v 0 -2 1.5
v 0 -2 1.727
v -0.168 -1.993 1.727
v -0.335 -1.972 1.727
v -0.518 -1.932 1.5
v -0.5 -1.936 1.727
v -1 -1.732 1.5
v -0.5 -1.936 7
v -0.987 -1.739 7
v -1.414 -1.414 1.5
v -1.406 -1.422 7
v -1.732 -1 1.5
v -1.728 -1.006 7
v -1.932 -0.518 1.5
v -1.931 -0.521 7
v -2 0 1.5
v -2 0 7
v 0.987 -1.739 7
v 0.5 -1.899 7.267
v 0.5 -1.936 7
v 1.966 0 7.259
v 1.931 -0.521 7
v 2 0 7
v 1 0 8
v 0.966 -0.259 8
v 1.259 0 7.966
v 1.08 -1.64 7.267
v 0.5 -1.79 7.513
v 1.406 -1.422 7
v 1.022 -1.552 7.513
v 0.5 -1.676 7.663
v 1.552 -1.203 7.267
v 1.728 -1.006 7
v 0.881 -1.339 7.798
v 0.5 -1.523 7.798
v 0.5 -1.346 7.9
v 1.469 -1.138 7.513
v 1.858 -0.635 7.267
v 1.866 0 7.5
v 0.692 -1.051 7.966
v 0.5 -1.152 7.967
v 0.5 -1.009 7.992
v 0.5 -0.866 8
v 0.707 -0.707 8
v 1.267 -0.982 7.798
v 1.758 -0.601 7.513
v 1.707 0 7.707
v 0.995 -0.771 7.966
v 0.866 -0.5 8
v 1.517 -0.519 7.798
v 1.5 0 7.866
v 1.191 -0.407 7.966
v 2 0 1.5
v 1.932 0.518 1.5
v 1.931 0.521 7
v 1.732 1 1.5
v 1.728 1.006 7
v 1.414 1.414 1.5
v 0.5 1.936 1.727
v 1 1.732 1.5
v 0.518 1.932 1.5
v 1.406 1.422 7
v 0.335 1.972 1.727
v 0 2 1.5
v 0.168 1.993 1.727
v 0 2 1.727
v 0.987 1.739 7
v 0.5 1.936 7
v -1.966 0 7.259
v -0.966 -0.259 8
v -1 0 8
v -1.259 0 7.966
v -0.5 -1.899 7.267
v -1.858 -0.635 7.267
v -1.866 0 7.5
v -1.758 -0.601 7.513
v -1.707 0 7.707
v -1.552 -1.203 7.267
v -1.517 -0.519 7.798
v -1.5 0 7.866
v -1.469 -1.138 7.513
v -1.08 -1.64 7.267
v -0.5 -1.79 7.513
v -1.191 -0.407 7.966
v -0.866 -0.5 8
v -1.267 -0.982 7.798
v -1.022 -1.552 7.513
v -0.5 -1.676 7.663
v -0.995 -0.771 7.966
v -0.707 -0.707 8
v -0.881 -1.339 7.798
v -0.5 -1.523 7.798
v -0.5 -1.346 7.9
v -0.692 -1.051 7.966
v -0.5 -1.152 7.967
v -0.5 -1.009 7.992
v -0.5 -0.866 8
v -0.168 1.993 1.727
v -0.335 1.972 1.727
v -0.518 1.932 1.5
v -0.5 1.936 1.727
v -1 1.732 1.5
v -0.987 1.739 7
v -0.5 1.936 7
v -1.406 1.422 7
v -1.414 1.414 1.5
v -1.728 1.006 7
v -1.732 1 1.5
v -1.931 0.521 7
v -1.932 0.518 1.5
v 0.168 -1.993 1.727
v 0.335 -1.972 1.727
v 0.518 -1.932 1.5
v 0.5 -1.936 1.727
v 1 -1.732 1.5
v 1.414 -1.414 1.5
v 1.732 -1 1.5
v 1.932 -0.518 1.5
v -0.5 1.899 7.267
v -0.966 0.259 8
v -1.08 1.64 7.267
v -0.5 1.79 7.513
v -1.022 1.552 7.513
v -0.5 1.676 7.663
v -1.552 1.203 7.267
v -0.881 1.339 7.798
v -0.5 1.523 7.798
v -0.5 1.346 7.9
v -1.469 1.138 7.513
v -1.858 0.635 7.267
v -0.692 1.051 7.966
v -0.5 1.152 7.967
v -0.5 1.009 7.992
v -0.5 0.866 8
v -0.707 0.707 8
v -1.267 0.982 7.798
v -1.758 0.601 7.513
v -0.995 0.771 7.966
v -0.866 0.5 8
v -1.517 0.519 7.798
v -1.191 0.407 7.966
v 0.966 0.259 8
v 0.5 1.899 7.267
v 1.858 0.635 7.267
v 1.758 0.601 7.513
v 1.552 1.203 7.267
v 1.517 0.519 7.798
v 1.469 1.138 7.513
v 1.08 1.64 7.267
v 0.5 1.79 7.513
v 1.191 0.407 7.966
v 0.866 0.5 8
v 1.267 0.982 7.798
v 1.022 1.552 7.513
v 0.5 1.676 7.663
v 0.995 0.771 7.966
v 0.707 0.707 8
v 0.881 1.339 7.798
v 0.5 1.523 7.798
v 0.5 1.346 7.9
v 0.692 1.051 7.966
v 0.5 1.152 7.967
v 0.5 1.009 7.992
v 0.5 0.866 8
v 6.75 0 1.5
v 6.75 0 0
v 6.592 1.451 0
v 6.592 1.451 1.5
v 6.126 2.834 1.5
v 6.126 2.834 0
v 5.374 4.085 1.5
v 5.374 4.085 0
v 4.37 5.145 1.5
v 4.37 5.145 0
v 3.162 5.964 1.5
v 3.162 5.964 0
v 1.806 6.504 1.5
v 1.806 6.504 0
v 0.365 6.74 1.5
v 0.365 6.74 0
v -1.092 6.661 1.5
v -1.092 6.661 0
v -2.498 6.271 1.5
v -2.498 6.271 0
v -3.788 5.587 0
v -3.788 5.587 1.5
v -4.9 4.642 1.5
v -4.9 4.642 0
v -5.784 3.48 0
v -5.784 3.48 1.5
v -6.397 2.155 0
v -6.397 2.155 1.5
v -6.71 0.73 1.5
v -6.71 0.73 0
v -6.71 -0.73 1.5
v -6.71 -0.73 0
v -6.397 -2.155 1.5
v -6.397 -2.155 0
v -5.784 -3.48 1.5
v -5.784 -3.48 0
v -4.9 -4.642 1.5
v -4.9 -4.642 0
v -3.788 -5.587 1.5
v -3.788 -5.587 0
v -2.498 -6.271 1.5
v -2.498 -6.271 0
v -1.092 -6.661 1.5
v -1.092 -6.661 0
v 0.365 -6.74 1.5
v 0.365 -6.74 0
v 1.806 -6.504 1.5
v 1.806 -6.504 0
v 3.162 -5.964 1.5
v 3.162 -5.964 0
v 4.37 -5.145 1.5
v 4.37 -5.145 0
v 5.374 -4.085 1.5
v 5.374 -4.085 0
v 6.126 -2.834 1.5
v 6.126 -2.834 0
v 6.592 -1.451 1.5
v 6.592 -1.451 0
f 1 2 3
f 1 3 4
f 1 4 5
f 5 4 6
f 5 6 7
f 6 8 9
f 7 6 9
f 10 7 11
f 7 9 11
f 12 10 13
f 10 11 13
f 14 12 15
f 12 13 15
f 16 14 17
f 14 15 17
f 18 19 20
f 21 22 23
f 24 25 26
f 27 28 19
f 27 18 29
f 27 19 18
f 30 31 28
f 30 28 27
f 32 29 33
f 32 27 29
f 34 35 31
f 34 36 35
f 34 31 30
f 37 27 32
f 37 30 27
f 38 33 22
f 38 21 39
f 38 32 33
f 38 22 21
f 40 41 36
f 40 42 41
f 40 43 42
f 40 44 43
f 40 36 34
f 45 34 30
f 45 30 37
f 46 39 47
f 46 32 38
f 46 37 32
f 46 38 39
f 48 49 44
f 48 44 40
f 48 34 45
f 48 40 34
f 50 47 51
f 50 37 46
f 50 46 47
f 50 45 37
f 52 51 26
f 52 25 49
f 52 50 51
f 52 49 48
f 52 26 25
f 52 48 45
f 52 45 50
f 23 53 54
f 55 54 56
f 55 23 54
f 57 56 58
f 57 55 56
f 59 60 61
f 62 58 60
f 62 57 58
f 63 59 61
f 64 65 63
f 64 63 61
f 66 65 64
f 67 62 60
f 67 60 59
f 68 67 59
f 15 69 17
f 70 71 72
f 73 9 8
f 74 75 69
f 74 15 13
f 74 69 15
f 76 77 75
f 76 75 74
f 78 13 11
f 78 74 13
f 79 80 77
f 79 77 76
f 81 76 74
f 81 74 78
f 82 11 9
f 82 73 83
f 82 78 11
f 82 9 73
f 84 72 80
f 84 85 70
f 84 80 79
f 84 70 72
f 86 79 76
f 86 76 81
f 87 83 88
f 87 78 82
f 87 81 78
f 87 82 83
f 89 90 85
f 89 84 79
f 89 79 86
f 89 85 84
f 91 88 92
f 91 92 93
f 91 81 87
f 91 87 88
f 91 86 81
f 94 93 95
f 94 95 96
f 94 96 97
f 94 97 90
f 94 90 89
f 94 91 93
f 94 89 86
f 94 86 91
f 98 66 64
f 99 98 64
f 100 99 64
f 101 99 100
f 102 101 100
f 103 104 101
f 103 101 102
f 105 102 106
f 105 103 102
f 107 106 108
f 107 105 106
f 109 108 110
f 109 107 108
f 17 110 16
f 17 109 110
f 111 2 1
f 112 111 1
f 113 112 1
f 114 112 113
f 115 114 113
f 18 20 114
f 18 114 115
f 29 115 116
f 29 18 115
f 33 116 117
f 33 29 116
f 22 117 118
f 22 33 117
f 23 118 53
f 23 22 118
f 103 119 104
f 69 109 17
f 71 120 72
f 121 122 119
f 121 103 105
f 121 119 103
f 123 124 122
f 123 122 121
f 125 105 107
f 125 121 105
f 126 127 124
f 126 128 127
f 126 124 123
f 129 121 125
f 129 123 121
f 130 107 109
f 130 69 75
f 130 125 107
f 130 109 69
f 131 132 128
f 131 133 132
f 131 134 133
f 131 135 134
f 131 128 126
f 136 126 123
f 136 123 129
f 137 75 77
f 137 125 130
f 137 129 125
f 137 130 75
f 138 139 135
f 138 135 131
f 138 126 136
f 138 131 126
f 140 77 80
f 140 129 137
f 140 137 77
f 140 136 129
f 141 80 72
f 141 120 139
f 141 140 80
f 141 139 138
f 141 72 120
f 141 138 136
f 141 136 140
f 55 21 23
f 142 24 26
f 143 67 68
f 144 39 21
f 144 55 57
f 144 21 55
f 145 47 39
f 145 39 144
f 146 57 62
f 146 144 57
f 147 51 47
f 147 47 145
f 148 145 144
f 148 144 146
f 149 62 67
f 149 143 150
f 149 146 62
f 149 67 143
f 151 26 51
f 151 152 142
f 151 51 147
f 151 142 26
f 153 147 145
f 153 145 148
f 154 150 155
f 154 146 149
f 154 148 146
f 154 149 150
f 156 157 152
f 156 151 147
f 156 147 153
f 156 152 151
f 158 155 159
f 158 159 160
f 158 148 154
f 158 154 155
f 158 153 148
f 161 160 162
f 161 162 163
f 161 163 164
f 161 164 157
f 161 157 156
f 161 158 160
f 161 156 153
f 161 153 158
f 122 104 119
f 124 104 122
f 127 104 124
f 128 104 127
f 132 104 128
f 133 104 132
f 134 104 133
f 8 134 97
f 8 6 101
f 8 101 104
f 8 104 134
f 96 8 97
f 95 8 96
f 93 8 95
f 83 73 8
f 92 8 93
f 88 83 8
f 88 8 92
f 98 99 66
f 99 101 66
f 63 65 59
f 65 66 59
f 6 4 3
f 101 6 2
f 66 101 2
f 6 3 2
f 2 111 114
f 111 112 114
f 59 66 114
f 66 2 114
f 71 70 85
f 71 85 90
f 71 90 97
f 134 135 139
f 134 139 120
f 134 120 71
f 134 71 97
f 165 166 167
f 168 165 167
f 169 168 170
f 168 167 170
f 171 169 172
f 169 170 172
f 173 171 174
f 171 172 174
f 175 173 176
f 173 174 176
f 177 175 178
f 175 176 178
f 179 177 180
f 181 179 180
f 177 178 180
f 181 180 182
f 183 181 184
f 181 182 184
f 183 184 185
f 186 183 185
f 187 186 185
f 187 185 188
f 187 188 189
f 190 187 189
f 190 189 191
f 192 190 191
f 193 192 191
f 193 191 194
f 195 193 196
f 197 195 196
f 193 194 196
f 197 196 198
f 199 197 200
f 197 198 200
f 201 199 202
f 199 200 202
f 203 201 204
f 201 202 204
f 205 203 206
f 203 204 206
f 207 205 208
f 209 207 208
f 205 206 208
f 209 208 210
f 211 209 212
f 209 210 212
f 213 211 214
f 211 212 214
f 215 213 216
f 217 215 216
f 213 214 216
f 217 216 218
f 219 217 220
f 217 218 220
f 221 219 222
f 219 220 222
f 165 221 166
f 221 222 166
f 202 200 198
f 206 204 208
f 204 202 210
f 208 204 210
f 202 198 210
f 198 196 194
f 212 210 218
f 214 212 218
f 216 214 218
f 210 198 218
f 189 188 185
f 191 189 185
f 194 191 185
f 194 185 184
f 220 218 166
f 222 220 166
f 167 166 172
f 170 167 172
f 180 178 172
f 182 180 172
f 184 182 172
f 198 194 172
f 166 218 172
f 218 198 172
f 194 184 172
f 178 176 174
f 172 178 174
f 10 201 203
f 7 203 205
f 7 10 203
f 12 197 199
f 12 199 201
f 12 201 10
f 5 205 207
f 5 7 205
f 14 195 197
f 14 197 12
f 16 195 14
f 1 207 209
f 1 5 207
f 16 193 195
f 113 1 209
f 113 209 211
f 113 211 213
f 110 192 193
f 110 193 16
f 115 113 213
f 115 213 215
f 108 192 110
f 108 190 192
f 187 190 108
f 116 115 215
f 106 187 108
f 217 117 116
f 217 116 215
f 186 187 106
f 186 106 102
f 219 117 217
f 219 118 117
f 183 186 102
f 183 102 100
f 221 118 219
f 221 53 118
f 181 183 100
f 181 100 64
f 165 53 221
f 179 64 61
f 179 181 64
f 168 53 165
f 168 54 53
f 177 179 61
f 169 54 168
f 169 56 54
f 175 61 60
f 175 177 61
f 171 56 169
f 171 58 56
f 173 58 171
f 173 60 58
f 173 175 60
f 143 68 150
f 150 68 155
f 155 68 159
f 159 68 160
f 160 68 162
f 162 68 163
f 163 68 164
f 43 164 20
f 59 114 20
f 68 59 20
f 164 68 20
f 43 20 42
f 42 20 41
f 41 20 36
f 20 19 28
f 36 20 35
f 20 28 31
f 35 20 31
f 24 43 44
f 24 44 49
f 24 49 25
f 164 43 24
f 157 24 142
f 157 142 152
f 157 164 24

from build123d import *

# Parameters (mm, degrees)
F0_R     = 6.75
F1_DEPTH = 1.5
F2_W     = 4
F2_H     = 4
F3_DEPTH = 6.5
F5_W     = 1
F5_H     = 6.2726680437
F6_DEPTH = 25
F7_R     = 1.99999
F8_R     = 1


# Not quite as in the source:
# - a fillet or chamfer is up to 0.001 mm smaller than in the source, because OpenCascade refuses the exact size


with BuildPart() as f1:
    # F0 (on Top) → F1 (new body)
    with BuildSketch(Plane.XY):
        Circle(F0_R)
    extrude(amount=F1_DEPTH)

    # F2 (on face) → F3 (join)
    with BuildSketch(Plane.XY.offset(1.5)):
        Rectangle(F2_W, F2_H)
    extrude(amount=F3_DEPTH)

    # F5 (on face) → F6 (cut)
    with BuildSketch(Plane.XZ.offset(2)):
        with Locations((0, 4.8636659781)):
            Rectangle(F5_W, F5_H)
    extrude(amount=-F6_DEPTH, mode=Mode.SUBTRACT)

    # F7 (radius 2 in the source; OpenCascade refuses exactly that, so slightly less here)
    f7_edges = [f1.edges().sort_by_distance(p)[0] for p in [
        (2, -2, 4.75),
        (2, 2, 4.75),
        (-2, 2, 4.75),
        (-2, -2, 4.75),
    ]]
    fillet(f7_edges, radius=F7_R)

    # F8
    f8_edges = [f1.edges().sort_by_distance(p)[0] for p in [
        (1.581139, 1.224752, 8),
        (-1.581139, 1.224752, 8),
    ]]
    fillet(f8_edges, radius=F8_R)


solid = f1.part
